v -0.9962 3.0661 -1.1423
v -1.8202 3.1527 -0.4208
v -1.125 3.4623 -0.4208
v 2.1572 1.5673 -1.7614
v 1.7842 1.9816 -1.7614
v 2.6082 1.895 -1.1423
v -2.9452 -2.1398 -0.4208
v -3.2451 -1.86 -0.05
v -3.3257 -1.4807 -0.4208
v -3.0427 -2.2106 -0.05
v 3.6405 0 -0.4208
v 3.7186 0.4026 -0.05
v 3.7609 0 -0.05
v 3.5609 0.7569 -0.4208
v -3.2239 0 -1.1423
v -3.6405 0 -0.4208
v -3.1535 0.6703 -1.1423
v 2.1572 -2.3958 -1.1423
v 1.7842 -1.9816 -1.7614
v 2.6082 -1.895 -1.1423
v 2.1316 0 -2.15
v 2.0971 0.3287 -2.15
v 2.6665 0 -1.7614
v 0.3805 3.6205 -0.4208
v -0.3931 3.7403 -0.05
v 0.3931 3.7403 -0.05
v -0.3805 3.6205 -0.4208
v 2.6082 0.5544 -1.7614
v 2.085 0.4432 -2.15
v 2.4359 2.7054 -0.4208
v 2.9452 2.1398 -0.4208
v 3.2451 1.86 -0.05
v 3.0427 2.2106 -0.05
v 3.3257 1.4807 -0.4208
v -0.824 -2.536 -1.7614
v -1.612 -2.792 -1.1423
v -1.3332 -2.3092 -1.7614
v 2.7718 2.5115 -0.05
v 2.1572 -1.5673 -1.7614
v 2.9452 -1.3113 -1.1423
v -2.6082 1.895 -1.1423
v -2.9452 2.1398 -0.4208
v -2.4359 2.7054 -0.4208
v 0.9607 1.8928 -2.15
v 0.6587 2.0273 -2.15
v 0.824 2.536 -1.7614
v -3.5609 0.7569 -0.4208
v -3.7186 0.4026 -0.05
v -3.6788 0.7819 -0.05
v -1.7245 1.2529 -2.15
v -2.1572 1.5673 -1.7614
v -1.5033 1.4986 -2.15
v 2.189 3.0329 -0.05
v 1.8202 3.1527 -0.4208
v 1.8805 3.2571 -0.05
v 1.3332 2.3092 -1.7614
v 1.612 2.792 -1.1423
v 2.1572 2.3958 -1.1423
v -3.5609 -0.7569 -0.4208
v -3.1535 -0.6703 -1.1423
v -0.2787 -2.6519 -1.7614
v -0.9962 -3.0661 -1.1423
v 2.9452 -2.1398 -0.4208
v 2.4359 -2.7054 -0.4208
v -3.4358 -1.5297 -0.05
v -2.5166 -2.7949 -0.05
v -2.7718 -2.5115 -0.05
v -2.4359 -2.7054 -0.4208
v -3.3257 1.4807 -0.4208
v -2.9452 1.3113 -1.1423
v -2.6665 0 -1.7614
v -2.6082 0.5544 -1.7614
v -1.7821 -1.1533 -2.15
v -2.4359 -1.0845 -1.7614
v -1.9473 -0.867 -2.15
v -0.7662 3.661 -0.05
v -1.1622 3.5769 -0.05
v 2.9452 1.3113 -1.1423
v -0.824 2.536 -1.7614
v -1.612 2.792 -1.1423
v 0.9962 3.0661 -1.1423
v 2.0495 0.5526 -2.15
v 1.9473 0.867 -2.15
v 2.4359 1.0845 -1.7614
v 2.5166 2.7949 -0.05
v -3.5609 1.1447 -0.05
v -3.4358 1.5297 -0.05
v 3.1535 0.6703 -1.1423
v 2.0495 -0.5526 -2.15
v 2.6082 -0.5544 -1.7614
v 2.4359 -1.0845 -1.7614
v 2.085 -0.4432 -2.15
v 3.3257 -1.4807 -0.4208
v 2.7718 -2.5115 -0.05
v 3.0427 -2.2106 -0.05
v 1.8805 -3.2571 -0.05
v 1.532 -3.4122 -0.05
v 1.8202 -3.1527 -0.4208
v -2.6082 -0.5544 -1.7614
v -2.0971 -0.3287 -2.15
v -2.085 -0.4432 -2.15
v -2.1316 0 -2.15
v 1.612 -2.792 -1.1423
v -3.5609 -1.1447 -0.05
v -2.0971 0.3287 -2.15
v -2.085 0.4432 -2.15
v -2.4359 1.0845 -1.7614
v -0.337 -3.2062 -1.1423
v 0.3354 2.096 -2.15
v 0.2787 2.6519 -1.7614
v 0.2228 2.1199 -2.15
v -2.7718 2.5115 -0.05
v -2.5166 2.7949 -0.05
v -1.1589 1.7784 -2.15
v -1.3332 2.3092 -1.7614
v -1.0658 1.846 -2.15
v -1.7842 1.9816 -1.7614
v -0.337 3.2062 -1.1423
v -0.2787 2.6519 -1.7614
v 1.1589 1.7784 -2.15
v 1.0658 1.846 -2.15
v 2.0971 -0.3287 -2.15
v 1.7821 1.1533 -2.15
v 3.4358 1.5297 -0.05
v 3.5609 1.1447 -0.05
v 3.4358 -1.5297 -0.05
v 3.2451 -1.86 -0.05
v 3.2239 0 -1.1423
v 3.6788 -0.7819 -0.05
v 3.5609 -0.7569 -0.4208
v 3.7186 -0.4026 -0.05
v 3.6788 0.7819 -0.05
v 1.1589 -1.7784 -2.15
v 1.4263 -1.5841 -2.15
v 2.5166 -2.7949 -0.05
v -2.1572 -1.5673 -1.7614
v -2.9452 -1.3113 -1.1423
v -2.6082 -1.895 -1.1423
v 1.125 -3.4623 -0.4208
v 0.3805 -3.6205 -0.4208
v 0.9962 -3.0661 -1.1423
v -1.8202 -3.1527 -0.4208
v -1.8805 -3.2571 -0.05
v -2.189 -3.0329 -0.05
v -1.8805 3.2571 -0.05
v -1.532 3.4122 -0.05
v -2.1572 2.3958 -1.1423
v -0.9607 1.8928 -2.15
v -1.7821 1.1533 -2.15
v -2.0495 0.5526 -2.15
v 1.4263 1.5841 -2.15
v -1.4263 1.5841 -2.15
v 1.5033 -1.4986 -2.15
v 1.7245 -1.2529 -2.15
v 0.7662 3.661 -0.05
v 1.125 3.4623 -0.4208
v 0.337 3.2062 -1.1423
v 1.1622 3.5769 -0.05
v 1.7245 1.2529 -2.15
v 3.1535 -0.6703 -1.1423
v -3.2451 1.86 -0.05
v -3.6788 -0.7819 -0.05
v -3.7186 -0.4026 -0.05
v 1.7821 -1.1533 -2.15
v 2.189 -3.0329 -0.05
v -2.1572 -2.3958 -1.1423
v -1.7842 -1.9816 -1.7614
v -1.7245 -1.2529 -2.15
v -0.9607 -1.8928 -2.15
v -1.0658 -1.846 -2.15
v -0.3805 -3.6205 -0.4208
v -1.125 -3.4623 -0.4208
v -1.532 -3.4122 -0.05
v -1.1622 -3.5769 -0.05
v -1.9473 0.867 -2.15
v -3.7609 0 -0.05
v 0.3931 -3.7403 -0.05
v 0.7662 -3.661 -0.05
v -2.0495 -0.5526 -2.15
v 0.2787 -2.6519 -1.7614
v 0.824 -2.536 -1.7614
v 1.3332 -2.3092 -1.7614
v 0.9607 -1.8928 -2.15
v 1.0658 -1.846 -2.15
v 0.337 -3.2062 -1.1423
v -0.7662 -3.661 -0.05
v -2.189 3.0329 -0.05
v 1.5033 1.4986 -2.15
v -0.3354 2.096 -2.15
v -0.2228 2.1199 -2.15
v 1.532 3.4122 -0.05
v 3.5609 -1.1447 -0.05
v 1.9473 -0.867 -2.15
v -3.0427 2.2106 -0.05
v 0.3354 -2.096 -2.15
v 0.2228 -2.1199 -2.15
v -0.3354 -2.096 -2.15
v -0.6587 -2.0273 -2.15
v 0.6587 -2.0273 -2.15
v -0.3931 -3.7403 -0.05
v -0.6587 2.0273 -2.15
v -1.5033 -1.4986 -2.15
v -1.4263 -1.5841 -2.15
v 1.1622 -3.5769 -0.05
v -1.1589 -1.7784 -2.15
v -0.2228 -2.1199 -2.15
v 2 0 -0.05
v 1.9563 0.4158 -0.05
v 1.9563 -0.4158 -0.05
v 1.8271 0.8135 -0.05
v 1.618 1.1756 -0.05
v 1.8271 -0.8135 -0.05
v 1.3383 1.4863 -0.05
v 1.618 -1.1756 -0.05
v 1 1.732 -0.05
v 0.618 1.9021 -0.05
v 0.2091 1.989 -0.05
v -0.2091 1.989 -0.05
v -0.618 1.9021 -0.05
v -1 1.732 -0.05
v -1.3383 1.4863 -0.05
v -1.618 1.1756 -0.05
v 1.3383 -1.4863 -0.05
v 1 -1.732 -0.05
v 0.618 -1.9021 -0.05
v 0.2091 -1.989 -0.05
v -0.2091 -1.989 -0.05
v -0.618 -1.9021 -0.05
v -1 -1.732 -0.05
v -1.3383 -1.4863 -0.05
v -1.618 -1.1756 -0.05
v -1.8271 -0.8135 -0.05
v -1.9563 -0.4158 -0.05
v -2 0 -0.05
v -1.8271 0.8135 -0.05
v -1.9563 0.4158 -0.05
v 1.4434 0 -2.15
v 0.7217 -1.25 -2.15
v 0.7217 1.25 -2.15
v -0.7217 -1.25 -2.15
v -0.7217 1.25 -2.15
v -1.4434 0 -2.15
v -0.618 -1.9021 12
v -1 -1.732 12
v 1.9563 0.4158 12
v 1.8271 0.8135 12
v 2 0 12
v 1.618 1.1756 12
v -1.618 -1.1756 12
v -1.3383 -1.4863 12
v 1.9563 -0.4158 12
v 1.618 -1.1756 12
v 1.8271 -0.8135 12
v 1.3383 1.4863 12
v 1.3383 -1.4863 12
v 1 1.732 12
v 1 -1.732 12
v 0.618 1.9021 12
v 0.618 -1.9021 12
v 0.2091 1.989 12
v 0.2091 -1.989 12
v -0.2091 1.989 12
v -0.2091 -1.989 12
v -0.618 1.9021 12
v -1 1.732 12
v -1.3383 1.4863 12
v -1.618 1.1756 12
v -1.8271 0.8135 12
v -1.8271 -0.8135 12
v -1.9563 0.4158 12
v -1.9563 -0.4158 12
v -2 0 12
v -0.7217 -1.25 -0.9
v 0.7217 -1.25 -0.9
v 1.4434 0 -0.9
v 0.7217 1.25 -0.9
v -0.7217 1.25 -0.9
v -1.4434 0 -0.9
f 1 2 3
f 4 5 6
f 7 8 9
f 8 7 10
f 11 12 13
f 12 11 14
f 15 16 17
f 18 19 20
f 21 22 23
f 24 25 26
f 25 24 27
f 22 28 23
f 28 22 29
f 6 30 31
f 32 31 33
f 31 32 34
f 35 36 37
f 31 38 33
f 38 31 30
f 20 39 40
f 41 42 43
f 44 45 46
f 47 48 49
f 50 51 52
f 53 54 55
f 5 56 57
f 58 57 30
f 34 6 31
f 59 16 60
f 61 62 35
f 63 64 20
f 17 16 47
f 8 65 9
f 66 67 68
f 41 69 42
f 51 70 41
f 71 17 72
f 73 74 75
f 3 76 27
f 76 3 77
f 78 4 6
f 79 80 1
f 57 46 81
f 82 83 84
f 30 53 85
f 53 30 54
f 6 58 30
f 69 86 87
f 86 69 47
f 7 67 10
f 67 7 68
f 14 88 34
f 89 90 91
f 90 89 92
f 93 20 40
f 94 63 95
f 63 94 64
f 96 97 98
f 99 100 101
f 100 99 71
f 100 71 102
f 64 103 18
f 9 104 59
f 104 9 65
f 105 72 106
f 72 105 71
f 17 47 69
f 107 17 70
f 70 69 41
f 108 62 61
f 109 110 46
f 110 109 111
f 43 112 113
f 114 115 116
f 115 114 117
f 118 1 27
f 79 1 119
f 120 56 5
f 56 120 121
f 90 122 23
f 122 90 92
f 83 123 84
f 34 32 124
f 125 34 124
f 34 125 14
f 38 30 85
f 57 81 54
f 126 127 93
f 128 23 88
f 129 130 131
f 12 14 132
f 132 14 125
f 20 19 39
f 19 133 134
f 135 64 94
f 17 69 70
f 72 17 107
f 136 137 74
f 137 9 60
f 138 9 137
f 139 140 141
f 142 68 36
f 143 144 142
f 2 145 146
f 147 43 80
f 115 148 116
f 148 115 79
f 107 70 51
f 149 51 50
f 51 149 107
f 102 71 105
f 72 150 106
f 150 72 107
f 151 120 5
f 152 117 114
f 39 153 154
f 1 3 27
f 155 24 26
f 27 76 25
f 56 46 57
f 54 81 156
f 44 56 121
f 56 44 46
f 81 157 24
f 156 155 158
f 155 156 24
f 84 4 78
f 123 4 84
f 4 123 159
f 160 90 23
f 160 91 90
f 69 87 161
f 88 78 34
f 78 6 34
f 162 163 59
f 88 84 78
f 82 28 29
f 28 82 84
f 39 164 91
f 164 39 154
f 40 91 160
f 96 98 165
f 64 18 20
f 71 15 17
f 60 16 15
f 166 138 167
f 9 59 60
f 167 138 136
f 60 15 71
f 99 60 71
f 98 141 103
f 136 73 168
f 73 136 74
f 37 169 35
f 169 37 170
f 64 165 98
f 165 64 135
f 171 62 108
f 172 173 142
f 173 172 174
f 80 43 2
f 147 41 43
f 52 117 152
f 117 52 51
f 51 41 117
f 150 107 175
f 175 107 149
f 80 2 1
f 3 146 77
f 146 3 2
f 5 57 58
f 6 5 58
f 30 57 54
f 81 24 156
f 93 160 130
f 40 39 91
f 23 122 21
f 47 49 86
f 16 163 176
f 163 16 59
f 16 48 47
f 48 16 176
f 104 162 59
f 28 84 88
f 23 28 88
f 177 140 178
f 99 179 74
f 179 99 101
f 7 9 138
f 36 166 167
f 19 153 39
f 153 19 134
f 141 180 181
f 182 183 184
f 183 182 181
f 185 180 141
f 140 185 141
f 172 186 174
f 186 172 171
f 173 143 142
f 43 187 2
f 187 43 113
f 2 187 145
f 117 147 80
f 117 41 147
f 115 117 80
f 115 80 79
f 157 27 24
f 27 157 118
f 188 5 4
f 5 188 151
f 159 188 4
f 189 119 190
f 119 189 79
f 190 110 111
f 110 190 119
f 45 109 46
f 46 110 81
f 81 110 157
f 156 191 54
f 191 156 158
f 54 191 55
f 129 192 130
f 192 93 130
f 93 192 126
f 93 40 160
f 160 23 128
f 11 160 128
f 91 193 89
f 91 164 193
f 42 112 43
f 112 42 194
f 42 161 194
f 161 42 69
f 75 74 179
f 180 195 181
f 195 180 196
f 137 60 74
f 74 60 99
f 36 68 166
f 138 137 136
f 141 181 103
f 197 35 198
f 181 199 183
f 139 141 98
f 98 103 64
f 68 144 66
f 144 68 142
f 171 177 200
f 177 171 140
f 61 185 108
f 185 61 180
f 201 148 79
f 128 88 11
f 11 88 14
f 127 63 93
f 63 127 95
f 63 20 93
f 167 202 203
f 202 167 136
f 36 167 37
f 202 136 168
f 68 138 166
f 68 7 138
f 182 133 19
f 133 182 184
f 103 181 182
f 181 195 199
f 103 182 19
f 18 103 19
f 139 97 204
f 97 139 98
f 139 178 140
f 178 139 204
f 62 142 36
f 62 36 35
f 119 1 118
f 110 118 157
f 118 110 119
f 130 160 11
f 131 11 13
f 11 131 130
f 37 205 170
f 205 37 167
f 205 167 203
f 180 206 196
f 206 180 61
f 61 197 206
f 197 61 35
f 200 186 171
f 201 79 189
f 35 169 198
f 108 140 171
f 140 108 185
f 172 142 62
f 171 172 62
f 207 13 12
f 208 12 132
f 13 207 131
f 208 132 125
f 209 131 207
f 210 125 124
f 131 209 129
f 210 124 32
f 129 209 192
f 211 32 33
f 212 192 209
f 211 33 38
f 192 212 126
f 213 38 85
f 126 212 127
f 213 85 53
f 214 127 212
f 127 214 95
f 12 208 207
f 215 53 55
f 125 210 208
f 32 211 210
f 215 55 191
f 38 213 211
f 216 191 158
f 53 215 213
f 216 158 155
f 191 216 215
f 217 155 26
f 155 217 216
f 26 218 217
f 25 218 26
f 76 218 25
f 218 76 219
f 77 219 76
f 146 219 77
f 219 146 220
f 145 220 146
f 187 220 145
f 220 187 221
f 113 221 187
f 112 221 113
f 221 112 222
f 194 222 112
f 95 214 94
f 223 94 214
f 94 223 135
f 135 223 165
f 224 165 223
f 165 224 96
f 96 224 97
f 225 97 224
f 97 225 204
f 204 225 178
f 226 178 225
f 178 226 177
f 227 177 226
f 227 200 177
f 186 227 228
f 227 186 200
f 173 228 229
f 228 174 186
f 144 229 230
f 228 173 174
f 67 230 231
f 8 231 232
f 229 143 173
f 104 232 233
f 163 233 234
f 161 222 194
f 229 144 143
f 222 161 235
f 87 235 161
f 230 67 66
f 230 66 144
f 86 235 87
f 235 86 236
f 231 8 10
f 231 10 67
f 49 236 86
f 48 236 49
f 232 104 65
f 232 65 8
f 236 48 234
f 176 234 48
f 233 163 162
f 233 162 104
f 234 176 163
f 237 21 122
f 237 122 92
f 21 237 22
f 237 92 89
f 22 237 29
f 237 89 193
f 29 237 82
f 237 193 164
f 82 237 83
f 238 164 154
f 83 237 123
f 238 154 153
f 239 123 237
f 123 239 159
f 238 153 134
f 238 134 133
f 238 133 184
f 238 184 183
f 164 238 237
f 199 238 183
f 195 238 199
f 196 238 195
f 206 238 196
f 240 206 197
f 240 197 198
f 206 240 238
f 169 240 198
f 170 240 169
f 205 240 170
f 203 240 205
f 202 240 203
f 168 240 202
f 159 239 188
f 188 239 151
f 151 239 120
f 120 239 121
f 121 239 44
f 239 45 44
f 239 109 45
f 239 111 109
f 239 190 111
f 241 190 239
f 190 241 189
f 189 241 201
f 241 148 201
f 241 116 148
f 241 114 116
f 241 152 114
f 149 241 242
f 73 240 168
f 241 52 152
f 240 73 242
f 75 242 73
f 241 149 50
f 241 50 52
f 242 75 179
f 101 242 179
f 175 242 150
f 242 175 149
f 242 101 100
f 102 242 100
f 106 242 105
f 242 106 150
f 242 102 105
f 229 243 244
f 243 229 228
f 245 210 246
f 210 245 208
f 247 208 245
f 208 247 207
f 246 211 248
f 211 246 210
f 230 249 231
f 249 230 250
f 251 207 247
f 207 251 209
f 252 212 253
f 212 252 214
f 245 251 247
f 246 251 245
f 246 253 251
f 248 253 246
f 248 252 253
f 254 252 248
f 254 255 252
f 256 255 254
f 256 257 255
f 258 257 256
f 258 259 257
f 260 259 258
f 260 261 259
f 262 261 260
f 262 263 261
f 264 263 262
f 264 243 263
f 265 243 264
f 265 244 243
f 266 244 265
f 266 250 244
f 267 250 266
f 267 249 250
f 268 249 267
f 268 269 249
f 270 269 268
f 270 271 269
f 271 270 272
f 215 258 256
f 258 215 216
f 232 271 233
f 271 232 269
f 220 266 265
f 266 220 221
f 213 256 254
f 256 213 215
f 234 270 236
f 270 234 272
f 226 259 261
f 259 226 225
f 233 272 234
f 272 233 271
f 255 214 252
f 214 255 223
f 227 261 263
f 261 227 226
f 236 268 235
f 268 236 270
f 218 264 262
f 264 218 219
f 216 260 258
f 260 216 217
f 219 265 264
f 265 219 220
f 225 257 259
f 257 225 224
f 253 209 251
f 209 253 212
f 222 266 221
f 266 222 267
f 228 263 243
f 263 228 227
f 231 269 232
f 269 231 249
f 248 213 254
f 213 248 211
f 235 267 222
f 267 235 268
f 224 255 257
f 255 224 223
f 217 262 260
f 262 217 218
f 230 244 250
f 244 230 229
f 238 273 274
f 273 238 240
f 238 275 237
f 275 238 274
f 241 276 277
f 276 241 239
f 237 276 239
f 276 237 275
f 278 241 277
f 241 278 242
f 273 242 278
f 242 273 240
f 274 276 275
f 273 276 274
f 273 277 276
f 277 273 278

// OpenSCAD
/*
   Copyright 2018 Scott Bezek and the splitflap contributors

   Licensed under the Apache License, Version 2.0 (the "License");
   you may not use this file except in compliance with the License.
   You may obtain a copy of the License at

       http://www.apache.org/licenses/LICENSE-2.0

   Unless required by applicable law or agreed to in writing, software
   distributed under the License is distributed on an "AS IS" BASIS,
   WITHOUT WARRANTIES OR CONDITIONS OF ANY KIND, either express or implied.
   See the License for the specific language governing permissions and
   limitations under the License.
*/

module roughM4_7380(length) {
    eps = 0.1;
    thread_diameter = 4;
    head_diameter = 7.6;
    head_length = 2.2;
    driving_depth = 1.3;
    driving_apothem = 2.5/2;
    driving_radius = driving_apothem / cos(180/6);

    sphere_offset = 1.2;  // Just a guess
    sphere_radius = sqrt(sphere_offset*sphere_offset + (head_diameter/2)*(head_diameter/2));


    difference() {
        union() {
            translate([0, 0, -eps]) {
                cylinder(h=length+eps, d=thread_diameter, $fn=30);
            }
            difference() {
                translate([0, 0, sphere_offset]) {
                    sphere(sphere_radius, $fn=30);
                }
                translate([0, 0, sphere_radius]) {
                    cube([sphere_radius*2 + eps, sphere_radius*2 + eps, sphere_radius*2 + eps], center=true);
                }
                translate([0, 0, -sphere_radius - head_length]) {
                    cube([sphere_radius*2 + eps, sphere_radius*2 + eps, sphere_radius*2 + eps], center=true);
                }
            }
        }
        translate([0, 0, -head_length-eps]) {
            cylinder(h=driving_depth+eps, r=driving_radius, $fn=6);
        }
    }
}

roughM4_7380(12);

        module color_selector(c) {
            precision = 0.0000001;  // arbitrary
            function compare_floats(x, y, i=0) = 
                  (len(x) != len(y)) ? false  // if arrays differ in length, they can't be equal
                : (i >= len(x)) ? true  // if we've hit the end of the arrays without issue, we're equal
                : (x[i] - precision <= y[i]) && x[i] + precision >= y[i]
                    ? compare_floats(x, y, i+1)
                    : false;  // not equal, short circuit

            if (c == [0.41572, 0.3252, 0.2268] || compare_floats(c, [0.41572, 0.3252, 0.2268]))
                children();
        }
                    
